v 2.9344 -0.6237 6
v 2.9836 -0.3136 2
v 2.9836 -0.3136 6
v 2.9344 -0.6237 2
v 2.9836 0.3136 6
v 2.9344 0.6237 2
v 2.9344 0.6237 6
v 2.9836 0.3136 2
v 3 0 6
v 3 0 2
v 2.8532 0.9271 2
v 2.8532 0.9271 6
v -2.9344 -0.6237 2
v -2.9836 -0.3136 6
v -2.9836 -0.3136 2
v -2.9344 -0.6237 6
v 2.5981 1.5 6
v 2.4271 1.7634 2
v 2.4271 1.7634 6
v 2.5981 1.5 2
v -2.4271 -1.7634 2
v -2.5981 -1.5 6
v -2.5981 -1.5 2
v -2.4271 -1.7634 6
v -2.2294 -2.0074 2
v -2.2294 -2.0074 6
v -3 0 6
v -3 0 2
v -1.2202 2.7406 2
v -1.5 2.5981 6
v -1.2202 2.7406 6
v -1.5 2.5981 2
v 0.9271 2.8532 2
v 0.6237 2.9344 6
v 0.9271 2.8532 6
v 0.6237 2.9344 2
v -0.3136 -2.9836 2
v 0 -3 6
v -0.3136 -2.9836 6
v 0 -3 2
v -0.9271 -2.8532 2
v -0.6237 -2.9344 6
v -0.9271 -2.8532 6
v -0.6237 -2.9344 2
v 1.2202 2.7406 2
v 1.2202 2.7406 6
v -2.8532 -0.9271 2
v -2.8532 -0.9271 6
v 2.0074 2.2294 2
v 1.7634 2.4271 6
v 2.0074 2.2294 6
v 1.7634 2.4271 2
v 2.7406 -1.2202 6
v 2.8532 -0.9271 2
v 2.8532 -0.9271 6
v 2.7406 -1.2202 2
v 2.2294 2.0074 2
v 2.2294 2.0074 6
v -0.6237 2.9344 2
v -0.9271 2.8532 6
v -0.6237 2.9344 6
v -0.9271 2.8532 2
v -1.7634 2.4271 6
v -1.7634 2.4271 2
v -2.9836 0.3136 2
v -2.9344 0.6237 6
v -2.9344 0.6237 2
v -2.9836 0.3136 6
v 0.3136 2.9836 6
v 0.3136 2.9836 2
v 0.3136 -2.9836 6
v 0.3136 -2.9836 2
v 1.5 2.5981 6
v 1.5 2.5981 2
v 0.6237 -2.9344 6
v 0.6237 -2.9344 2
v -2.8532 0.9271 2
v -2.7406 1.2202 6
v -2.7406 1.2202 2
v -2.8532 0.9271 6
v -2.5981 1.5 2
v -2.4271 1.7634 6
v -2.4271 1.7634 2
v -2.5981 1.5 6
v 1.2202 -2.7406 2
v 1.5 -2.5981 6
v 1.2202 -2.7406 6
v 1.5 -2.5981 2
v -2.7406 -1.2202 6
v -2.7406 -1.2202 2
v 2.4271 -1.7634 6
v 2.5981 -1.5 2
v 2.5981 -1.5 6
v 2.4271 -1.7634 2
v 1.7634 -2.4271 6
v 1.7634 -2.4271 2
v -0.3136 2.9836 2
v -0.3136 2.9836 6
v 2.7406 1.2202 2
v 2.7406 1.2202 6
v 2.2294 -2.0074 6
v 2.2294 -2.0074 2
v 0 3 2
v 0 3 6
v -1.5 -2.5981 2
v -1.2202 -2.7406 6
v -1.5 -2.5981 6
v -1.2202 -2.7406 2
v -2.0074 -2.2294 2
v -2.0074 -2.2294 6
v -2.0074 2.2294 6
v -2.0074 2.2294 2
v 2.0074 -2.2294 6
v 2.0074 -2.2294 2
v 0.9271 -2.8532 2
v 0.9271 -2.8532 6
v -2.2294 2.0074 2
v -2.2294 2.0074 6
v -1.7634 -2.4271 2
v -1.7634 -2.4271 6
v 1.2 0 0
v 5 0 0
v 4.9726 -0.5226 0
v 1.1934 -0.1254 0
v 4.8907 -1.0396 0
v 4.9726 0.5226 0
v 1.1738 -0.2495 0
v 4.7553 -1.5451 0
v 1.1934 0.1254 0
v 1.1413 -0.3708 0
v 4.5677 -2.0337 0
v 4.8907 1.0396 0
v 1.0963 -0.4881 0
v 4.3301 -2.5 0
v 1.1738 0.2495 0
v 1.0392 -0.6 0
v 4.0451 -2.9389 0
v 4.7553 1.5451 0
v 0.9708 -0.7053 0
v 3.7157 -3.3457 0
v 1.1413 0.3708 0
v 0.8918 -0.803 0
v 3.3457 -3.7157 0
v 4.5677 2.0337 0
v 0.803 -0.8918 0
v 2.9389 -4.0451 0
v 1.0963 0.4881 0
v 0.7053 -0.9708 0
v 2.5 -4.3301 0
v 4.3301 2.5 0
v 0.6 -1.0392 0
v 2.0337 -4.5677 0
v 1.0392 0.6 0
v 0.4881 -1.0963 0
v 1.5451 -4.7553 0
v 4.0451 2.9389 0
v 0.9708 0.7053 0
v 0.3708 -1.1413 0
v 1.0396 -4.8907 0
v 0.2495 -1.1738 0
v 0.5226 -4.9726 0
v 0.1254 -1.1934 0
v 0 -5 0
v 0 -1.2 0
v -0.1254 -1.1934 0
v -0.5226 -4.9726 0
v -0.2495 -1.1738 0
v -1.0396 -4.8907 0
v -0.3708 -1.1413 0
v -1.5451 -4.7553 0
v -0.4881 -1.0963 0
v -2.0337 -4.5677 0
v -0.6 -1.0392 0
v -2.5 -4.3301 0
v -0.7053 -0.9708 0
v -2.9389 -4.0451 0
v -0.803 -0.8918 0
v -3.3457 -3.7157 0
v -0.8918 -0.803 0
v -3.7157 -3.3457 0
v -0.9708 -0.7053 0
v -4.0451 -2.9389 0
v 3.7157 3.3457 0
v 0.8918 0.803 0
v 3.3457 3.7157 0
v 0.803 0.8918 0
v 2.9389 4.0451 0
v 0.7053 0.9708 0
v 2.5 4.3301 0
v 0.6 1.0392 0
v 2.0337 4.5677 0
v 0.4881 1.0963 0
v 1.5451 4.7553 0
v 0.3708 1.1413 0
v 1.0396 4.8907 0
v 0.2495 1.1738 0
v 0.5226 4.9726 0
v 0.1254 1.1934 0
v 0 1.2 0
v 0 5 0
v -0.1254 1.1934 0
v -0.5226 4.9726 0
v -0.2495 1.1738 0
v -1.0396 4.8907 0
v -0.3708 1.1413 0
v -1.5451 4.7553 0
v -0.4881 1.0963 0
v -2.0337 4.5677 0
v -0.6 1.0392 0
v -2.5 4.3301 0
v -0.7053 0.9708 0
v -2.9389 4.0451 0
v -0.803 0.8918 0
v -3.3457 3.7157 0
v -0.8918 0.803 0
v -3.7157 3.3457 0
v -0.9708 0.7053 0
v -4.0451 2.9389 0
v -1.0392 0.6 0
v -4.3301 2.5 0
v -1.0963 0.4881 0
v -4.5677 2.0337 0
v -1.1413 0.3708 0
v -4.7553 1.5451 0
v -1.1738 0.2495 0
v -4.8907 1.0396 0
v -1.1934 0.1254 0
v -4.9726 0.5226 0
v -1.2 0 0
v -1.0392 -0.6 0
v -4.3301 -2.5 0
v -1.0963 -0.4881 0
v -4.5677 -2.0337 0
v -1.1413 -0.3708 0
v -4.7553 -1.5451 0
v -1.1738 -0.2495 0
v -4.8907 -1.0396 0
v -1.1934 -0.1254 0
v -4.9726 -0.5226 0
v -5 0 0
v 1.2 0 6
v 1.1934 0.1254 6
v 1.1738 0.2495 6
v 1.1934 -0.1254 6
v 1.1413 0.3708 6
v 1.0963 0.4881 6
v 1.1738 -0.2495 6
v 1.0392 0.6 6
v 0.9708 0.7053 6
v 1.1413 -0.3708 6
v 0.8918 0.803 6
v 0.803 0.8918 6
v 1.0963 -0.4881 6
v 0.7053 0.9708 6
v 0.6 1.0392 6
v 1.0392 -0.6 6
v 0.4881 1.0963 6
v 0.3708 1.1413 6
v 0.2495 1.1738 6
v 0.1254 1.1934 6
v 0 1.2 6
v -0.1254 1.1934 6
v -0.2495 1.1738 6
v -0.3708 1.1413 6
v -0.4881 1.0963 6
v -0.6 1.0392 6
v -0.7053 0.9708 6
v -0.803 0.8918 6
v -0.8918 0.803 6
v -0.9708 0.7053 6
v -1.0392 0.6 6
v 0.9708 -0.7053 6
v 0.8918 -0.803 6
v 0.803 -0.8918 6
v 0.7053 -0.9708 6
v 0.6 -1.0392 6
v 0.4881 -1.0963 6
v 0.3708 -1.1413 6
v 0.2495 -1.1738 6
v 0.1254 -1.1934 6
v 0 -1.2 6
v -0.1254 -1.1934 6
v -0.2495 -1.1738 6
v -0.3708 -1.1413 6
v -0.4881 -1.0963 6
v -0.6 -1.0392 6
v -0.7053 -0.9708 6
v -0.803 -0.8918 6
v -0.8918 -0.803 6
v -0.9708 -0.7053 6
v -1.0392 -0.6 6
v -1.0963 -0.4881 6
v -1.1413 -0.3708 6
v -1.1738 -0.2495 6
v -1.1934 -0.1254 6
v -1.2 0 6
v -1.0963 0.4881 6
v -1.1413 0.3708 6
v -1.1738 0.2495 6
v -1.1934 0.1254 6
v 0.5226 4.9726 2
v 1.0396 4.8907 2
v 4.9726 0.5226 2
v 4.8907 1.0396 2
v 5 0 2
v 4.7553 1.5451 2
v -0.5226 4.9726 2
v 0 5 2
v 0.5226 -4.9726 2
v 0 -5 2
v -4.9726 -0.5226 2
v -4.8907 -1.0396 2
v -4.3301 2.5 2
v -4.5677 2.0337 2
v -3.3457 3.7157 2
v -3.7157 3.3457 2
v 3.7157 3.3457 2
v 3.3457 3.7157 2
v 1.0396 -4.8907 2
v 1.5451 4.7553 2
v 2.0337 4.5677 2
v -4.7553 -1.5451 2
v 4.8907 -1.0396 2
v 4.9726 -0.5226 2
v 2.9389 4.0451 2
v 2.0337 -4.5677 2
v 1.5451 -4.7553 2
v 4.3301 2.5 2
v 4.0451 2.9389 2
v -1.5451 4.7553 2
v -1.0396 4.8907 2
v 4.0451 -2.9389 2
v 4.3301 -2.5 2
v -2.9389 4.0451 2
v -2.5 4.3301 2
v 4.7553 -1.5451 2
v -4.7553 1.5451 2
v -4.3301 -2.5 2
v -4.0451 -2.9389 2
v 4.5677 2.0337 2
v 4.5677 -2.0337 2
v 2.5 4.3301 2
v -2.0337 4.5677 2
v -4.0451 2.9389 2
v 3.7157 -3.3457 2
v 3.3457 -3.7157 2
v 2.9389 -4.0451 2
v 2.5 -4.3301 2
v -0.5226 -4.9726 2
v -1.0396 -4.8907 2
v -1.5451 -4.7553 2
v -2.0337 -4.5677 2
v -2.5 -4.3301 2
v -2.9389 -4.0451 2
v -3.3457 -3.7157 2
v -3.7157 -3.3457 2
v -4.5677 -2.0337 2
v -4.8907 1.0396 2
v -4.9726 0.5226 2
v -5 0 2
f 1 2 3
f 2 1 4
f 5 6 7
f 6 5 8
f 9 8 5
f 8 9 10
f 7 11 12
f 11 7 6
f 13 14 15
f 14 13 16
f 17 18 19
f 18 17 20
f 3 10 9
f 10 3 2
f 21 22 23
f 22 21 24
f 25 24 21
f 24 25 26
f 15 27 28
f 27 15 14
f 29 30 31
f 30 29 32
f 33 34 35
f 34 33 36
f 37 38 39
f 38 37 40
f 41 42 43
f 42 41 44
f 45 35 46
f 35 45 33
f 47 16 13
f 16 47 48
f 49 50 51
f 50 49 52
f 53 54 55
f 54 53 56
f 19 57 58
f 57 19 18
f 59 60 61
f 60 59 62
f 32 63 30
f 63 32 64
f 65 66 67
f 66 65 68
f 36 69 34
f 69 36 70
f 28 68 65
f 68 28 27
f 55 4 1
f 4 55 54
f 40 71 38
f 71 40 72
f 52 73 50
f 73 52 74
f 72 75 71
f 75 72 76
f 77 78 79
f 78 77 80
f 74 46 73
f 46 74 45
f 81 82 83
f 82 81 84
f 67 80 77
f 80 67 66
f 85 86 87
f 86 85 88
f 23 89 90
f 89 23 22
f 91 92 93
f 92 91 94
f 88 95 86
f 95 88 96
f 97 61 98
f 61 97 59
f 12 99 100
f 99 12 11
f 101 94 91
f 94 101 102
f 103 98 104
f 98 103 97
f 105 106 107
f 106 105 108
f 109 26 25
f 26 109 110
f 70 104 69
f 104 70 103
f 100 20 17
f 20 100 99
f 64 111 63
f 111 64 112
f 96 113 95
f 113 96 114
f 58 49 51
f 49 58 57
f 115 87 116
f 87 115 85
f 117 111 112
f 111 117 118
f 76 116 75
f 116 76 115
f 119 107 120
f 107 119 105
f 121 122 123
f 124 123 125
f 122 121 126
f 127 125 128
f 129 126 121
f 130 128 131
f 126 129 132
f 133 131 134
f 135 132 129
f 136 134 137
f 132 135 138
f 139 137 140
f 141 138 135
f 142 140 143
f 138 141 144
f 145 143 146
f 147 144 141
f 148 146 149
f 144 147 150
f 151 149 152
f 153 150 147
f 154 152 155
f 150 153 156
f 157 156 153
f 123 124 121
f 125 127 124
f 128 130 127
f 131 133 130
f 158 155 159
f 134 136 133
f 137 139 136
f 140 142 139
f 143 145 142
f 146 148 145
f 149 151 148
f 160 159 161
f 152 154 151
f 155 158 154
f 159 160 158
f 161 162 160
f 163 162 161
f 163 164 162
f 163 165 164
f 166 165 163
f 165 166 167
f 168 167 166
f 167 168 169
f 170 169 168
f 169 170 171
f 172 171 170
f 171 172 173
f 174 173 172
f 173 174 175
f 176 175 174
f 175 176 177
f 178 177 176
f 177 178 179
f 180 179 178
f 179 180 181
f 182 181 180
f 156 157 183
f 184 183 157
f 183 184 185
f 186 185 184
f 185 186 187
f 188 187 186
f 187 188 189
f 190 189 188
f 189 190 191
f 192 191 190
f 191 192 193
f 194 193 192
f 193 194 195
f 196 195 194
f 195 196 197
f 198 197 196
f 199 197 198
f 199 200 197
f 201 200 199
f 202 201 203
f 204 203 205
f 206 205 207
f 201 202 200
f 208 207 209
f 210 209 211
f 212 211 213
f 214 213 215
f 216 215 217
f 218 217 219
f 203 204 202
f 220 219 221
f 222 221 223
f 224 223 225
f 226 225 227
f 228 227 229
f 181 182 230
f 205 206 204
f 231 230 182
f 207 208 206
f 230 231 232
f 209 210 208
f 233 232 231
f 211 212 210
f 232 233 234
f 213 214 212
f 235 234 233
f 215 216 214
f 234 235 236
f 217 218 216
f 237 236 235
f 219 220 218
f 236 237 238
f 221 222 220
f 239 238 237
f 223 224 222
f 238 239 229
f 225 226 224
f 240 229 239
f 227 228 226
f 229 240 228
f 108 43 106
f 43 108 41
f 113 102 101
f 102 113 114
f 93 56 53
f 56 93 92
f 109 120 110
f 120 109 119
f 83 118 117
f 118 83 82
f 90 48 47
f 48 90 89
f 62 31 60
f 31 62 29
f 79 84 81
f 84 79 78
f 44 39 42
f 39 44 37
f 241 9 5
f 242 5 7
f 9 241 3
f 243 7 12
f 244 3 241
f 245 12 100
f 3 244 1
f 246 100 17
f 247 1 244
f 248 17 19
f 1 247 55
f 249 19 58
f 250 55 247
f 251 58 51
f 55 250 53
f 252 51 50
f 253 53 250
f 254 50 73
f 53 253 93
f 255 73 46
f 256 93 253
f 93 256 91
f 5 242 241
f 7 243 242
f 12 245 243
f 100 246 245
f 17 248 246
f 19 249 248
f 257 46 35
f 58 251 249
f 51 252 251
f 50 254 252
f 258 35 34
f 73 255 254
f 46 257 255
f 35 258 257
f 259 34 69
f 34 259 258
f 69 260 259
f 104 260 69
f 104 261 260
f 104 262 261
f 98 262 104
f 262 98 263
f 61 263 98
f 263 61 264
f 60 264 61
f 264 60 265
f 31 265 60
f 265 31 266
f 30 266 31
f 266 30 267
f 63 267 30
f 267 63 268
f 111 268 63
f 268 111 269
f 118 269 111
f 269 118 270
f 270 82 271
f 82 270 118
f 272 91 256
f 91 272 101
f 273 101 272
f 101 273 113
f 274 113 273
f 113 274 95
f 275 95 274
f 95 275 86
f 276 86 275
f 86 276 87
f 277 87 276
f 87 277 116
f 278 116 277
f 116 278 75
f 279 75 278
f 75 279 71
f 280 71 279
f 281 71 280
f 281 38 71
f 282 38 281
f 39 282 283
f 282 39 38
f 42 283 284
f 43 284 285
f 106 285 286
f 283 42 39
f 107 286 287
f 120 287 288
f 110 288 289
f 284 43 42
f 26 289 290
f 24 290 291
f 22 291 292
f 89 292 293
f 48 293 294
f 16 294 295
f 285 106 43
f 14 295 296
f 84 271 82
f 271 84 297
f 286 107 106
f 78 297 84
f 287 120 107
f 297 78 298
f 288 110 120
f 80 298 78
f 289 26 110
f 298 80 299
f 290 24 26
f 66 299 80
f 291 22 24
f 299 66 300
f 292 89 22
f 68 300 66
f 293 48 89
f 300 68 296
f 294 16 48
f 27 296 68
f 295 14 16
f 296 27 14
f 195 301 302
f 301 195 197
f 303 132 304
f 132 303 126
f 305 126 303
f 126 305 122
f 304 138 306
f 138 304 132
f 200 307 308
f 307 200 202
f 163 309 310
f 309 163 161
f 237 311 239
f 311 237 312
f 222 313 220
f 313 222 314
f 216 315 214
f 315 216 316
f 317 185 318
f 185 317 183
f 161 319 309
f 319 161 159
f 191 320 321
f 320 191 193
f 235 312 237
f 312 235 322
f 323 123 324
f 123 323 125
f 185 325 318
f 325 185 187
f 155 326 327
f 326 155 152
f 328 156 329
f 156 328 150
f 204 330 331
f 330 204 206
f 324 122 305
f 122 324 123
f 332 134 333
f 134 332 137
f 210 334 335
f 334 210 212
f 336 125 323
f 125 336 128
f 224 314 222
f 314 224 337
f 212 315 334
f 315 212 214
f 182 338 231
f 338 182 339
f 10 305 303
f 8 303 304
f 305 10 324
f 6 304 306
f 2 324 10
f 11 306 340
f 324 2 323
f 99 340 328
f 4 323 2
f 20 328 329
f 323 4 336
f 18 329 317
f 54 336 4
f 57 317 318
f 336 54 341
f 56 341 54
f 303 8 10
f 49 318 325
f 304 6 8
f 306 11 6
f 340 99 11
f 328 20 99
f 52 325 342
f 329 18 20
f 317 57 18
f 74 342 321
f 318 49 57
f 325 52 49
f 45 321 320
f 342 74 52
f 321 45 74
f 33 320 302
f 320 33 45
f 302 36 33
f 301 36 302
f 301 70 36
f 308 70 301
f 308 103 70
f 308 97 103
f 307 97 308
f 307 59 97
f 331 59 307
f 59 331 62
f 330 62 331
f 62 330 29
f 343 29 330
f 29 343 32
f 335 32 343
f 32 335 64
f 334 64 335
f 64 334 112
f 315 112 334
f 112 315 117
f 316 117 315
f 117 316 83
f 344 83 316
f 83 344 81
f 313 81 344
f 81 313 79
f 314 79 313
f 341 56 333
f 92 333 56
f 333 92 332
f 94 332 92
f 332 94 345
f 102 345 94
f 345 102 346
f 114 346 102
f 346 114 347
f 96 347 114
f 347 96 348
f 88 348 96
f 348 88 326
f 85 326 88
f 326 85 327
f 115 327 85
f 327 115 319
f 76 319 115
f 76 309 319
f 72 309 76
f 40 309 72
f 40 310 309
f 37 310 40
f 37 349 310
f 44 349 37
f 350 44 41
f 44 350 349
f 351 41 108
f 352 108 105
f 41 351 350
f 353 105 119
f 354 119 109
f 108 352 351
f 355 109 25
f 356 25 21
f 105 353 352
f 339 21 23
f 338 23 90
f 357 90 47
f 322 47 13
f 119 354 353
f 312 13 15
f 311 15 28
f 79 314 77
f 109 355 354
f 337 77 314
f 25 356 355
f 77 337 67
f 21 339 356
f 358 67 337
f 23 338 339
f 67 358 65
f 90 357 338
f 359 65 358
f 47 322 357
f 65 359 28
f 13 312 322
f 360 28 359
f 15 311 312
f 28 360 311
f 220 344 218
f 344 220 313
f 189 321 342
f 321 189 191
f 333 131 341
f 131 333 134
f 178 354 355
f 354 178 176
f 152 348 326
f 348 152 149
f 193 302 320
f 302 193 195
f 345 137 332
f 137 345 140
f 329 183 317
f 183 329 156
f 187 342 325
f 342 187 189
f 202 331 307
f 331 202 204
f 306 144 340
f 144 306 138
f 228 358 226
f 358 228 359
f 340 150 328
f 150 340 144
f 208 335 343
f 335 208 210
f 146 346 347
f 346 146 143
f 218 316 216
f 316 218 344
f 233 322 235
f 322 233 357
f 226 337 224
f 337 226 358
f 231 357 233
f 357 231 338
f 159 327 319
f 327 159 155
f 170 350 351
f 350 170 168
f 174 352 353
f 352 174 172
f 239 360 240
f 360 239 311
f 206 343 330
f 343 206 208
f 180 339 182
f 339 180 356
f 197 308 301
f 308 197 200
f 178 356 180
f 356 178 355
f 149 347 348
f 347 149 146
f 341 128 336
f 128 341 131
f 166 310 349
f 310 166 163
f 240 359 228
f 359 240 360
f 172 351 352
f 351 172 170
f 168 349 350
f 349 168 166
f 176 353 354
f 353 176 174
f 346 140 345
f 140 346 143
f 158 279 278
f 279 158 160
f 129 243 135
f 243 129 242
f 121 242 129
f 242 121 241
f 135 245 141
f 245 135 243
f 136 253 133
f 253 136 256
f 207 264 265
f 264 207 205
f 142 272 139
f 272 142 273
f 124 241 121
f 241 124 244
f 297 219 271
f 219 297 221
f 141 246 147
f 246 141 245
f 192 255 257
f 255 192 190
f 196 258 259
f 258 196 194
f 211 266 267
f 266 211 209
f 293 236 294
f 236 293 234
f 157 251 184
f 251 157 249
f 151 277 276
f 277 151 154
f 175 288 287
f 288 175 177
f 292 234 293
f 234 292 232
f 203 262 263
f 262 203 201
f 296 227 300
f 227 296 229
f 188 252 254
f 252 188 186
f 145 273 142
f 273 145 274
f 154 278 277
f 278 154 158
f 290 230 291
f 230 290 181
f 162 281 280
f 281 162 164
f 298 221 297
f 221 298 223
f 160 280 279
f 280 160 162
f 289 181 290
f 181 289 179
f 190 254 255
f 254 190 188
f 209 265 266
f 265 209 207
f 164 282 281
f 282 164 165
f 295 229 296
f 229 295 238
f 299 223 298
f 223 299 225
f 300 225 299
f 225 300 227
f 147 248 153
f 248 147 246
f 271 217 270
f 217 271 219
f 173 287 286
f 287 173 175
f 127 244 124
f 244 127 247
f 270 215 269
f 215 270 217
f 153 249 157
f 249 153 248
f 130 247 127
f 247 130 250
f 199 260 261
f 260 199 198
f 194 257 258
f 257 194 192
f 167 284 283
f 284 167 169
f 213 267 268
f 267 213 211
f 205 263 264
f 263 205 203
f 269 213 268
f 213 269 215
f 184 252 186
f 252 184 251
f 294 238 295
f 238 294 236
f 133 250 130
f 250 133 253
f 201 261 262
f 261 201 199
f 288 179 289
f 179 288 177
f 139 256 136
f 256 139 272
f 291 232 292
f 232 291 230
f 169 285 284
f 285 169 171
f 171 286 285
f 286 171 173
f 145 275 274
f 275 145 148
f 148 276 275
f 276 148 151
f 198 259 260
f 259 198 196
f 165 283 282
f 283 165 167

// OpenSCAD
// Motor mounting standoff.
$fn = 60;
eps = 0.02;
thread_d = 2.4;
outer_d = 6;
length = 6;
difference() {
    union() { cylinder(d=outer_d,h=length); cylinder(d=outer_d+4,h=2); }
    translate([0,0,-eps]) cylinder(d=thread_d,h=length+2*eps);
}
